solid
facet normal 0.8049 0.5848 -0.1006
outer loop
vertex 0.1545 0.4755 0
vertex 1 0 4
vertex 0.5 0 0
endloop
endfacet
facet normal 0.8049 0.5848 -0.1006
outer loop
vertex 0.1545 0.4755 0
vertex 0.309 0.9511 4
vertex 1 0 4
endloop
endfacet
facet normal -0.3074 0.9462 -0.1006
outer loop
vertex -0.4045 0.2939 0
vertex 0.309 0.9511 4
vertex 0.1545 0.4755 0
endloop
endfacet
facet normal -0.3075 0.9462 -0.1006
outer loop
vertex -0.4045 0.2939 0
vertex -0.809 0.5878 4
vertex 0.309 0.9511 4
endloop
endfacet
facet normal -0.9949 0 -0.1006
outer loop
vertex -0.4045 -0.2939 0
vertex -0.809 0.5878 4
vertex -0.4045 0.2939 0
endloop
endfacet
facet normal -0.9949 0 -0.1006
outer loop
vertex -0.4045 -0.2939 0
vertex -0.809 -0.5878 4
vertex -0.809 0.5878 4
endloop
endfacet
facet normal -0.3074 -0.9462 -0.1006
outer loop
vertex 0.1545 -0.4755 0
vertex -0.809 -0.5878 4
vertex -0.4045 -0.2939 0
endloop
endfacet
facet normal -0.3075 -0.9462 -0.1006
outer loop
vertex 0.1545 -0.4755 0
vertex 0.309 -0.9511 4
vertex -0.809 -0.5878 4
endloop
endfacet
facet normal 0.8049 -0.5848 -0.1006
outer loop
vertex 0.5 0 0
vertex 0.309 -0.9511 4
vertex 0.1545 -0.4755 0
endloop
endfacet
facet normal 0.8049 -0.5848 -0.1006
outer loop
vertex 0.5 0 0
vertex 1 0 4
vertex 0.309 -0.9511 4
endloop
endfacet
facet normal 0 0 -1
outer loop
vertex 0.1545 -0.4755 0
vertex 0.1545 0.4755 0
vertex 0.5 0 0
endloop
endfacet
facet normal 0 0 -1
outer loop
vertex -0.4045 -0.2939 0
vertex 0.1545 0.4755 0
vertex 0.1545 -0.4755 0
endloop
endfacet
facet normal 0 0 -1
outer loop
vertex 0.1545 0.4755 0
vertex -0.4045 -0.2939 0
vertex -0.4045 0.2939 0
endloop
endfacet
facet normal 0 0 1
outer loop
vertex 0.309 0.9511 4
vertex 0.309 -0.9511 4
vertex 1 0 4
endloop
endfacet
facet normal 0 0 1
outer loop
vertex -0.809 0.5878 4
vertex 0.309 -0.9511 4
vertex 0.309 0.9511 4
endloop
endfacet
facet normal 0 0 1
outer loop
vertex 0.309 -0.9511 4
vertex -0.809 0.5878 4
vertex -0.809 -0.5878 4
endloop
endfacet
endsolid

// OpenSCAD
a=1;/* a
b
c */

/* hel
lo */
b=2;
function f()=4;
c=4;
cylinder(d1=a,d2=b,h=c);
